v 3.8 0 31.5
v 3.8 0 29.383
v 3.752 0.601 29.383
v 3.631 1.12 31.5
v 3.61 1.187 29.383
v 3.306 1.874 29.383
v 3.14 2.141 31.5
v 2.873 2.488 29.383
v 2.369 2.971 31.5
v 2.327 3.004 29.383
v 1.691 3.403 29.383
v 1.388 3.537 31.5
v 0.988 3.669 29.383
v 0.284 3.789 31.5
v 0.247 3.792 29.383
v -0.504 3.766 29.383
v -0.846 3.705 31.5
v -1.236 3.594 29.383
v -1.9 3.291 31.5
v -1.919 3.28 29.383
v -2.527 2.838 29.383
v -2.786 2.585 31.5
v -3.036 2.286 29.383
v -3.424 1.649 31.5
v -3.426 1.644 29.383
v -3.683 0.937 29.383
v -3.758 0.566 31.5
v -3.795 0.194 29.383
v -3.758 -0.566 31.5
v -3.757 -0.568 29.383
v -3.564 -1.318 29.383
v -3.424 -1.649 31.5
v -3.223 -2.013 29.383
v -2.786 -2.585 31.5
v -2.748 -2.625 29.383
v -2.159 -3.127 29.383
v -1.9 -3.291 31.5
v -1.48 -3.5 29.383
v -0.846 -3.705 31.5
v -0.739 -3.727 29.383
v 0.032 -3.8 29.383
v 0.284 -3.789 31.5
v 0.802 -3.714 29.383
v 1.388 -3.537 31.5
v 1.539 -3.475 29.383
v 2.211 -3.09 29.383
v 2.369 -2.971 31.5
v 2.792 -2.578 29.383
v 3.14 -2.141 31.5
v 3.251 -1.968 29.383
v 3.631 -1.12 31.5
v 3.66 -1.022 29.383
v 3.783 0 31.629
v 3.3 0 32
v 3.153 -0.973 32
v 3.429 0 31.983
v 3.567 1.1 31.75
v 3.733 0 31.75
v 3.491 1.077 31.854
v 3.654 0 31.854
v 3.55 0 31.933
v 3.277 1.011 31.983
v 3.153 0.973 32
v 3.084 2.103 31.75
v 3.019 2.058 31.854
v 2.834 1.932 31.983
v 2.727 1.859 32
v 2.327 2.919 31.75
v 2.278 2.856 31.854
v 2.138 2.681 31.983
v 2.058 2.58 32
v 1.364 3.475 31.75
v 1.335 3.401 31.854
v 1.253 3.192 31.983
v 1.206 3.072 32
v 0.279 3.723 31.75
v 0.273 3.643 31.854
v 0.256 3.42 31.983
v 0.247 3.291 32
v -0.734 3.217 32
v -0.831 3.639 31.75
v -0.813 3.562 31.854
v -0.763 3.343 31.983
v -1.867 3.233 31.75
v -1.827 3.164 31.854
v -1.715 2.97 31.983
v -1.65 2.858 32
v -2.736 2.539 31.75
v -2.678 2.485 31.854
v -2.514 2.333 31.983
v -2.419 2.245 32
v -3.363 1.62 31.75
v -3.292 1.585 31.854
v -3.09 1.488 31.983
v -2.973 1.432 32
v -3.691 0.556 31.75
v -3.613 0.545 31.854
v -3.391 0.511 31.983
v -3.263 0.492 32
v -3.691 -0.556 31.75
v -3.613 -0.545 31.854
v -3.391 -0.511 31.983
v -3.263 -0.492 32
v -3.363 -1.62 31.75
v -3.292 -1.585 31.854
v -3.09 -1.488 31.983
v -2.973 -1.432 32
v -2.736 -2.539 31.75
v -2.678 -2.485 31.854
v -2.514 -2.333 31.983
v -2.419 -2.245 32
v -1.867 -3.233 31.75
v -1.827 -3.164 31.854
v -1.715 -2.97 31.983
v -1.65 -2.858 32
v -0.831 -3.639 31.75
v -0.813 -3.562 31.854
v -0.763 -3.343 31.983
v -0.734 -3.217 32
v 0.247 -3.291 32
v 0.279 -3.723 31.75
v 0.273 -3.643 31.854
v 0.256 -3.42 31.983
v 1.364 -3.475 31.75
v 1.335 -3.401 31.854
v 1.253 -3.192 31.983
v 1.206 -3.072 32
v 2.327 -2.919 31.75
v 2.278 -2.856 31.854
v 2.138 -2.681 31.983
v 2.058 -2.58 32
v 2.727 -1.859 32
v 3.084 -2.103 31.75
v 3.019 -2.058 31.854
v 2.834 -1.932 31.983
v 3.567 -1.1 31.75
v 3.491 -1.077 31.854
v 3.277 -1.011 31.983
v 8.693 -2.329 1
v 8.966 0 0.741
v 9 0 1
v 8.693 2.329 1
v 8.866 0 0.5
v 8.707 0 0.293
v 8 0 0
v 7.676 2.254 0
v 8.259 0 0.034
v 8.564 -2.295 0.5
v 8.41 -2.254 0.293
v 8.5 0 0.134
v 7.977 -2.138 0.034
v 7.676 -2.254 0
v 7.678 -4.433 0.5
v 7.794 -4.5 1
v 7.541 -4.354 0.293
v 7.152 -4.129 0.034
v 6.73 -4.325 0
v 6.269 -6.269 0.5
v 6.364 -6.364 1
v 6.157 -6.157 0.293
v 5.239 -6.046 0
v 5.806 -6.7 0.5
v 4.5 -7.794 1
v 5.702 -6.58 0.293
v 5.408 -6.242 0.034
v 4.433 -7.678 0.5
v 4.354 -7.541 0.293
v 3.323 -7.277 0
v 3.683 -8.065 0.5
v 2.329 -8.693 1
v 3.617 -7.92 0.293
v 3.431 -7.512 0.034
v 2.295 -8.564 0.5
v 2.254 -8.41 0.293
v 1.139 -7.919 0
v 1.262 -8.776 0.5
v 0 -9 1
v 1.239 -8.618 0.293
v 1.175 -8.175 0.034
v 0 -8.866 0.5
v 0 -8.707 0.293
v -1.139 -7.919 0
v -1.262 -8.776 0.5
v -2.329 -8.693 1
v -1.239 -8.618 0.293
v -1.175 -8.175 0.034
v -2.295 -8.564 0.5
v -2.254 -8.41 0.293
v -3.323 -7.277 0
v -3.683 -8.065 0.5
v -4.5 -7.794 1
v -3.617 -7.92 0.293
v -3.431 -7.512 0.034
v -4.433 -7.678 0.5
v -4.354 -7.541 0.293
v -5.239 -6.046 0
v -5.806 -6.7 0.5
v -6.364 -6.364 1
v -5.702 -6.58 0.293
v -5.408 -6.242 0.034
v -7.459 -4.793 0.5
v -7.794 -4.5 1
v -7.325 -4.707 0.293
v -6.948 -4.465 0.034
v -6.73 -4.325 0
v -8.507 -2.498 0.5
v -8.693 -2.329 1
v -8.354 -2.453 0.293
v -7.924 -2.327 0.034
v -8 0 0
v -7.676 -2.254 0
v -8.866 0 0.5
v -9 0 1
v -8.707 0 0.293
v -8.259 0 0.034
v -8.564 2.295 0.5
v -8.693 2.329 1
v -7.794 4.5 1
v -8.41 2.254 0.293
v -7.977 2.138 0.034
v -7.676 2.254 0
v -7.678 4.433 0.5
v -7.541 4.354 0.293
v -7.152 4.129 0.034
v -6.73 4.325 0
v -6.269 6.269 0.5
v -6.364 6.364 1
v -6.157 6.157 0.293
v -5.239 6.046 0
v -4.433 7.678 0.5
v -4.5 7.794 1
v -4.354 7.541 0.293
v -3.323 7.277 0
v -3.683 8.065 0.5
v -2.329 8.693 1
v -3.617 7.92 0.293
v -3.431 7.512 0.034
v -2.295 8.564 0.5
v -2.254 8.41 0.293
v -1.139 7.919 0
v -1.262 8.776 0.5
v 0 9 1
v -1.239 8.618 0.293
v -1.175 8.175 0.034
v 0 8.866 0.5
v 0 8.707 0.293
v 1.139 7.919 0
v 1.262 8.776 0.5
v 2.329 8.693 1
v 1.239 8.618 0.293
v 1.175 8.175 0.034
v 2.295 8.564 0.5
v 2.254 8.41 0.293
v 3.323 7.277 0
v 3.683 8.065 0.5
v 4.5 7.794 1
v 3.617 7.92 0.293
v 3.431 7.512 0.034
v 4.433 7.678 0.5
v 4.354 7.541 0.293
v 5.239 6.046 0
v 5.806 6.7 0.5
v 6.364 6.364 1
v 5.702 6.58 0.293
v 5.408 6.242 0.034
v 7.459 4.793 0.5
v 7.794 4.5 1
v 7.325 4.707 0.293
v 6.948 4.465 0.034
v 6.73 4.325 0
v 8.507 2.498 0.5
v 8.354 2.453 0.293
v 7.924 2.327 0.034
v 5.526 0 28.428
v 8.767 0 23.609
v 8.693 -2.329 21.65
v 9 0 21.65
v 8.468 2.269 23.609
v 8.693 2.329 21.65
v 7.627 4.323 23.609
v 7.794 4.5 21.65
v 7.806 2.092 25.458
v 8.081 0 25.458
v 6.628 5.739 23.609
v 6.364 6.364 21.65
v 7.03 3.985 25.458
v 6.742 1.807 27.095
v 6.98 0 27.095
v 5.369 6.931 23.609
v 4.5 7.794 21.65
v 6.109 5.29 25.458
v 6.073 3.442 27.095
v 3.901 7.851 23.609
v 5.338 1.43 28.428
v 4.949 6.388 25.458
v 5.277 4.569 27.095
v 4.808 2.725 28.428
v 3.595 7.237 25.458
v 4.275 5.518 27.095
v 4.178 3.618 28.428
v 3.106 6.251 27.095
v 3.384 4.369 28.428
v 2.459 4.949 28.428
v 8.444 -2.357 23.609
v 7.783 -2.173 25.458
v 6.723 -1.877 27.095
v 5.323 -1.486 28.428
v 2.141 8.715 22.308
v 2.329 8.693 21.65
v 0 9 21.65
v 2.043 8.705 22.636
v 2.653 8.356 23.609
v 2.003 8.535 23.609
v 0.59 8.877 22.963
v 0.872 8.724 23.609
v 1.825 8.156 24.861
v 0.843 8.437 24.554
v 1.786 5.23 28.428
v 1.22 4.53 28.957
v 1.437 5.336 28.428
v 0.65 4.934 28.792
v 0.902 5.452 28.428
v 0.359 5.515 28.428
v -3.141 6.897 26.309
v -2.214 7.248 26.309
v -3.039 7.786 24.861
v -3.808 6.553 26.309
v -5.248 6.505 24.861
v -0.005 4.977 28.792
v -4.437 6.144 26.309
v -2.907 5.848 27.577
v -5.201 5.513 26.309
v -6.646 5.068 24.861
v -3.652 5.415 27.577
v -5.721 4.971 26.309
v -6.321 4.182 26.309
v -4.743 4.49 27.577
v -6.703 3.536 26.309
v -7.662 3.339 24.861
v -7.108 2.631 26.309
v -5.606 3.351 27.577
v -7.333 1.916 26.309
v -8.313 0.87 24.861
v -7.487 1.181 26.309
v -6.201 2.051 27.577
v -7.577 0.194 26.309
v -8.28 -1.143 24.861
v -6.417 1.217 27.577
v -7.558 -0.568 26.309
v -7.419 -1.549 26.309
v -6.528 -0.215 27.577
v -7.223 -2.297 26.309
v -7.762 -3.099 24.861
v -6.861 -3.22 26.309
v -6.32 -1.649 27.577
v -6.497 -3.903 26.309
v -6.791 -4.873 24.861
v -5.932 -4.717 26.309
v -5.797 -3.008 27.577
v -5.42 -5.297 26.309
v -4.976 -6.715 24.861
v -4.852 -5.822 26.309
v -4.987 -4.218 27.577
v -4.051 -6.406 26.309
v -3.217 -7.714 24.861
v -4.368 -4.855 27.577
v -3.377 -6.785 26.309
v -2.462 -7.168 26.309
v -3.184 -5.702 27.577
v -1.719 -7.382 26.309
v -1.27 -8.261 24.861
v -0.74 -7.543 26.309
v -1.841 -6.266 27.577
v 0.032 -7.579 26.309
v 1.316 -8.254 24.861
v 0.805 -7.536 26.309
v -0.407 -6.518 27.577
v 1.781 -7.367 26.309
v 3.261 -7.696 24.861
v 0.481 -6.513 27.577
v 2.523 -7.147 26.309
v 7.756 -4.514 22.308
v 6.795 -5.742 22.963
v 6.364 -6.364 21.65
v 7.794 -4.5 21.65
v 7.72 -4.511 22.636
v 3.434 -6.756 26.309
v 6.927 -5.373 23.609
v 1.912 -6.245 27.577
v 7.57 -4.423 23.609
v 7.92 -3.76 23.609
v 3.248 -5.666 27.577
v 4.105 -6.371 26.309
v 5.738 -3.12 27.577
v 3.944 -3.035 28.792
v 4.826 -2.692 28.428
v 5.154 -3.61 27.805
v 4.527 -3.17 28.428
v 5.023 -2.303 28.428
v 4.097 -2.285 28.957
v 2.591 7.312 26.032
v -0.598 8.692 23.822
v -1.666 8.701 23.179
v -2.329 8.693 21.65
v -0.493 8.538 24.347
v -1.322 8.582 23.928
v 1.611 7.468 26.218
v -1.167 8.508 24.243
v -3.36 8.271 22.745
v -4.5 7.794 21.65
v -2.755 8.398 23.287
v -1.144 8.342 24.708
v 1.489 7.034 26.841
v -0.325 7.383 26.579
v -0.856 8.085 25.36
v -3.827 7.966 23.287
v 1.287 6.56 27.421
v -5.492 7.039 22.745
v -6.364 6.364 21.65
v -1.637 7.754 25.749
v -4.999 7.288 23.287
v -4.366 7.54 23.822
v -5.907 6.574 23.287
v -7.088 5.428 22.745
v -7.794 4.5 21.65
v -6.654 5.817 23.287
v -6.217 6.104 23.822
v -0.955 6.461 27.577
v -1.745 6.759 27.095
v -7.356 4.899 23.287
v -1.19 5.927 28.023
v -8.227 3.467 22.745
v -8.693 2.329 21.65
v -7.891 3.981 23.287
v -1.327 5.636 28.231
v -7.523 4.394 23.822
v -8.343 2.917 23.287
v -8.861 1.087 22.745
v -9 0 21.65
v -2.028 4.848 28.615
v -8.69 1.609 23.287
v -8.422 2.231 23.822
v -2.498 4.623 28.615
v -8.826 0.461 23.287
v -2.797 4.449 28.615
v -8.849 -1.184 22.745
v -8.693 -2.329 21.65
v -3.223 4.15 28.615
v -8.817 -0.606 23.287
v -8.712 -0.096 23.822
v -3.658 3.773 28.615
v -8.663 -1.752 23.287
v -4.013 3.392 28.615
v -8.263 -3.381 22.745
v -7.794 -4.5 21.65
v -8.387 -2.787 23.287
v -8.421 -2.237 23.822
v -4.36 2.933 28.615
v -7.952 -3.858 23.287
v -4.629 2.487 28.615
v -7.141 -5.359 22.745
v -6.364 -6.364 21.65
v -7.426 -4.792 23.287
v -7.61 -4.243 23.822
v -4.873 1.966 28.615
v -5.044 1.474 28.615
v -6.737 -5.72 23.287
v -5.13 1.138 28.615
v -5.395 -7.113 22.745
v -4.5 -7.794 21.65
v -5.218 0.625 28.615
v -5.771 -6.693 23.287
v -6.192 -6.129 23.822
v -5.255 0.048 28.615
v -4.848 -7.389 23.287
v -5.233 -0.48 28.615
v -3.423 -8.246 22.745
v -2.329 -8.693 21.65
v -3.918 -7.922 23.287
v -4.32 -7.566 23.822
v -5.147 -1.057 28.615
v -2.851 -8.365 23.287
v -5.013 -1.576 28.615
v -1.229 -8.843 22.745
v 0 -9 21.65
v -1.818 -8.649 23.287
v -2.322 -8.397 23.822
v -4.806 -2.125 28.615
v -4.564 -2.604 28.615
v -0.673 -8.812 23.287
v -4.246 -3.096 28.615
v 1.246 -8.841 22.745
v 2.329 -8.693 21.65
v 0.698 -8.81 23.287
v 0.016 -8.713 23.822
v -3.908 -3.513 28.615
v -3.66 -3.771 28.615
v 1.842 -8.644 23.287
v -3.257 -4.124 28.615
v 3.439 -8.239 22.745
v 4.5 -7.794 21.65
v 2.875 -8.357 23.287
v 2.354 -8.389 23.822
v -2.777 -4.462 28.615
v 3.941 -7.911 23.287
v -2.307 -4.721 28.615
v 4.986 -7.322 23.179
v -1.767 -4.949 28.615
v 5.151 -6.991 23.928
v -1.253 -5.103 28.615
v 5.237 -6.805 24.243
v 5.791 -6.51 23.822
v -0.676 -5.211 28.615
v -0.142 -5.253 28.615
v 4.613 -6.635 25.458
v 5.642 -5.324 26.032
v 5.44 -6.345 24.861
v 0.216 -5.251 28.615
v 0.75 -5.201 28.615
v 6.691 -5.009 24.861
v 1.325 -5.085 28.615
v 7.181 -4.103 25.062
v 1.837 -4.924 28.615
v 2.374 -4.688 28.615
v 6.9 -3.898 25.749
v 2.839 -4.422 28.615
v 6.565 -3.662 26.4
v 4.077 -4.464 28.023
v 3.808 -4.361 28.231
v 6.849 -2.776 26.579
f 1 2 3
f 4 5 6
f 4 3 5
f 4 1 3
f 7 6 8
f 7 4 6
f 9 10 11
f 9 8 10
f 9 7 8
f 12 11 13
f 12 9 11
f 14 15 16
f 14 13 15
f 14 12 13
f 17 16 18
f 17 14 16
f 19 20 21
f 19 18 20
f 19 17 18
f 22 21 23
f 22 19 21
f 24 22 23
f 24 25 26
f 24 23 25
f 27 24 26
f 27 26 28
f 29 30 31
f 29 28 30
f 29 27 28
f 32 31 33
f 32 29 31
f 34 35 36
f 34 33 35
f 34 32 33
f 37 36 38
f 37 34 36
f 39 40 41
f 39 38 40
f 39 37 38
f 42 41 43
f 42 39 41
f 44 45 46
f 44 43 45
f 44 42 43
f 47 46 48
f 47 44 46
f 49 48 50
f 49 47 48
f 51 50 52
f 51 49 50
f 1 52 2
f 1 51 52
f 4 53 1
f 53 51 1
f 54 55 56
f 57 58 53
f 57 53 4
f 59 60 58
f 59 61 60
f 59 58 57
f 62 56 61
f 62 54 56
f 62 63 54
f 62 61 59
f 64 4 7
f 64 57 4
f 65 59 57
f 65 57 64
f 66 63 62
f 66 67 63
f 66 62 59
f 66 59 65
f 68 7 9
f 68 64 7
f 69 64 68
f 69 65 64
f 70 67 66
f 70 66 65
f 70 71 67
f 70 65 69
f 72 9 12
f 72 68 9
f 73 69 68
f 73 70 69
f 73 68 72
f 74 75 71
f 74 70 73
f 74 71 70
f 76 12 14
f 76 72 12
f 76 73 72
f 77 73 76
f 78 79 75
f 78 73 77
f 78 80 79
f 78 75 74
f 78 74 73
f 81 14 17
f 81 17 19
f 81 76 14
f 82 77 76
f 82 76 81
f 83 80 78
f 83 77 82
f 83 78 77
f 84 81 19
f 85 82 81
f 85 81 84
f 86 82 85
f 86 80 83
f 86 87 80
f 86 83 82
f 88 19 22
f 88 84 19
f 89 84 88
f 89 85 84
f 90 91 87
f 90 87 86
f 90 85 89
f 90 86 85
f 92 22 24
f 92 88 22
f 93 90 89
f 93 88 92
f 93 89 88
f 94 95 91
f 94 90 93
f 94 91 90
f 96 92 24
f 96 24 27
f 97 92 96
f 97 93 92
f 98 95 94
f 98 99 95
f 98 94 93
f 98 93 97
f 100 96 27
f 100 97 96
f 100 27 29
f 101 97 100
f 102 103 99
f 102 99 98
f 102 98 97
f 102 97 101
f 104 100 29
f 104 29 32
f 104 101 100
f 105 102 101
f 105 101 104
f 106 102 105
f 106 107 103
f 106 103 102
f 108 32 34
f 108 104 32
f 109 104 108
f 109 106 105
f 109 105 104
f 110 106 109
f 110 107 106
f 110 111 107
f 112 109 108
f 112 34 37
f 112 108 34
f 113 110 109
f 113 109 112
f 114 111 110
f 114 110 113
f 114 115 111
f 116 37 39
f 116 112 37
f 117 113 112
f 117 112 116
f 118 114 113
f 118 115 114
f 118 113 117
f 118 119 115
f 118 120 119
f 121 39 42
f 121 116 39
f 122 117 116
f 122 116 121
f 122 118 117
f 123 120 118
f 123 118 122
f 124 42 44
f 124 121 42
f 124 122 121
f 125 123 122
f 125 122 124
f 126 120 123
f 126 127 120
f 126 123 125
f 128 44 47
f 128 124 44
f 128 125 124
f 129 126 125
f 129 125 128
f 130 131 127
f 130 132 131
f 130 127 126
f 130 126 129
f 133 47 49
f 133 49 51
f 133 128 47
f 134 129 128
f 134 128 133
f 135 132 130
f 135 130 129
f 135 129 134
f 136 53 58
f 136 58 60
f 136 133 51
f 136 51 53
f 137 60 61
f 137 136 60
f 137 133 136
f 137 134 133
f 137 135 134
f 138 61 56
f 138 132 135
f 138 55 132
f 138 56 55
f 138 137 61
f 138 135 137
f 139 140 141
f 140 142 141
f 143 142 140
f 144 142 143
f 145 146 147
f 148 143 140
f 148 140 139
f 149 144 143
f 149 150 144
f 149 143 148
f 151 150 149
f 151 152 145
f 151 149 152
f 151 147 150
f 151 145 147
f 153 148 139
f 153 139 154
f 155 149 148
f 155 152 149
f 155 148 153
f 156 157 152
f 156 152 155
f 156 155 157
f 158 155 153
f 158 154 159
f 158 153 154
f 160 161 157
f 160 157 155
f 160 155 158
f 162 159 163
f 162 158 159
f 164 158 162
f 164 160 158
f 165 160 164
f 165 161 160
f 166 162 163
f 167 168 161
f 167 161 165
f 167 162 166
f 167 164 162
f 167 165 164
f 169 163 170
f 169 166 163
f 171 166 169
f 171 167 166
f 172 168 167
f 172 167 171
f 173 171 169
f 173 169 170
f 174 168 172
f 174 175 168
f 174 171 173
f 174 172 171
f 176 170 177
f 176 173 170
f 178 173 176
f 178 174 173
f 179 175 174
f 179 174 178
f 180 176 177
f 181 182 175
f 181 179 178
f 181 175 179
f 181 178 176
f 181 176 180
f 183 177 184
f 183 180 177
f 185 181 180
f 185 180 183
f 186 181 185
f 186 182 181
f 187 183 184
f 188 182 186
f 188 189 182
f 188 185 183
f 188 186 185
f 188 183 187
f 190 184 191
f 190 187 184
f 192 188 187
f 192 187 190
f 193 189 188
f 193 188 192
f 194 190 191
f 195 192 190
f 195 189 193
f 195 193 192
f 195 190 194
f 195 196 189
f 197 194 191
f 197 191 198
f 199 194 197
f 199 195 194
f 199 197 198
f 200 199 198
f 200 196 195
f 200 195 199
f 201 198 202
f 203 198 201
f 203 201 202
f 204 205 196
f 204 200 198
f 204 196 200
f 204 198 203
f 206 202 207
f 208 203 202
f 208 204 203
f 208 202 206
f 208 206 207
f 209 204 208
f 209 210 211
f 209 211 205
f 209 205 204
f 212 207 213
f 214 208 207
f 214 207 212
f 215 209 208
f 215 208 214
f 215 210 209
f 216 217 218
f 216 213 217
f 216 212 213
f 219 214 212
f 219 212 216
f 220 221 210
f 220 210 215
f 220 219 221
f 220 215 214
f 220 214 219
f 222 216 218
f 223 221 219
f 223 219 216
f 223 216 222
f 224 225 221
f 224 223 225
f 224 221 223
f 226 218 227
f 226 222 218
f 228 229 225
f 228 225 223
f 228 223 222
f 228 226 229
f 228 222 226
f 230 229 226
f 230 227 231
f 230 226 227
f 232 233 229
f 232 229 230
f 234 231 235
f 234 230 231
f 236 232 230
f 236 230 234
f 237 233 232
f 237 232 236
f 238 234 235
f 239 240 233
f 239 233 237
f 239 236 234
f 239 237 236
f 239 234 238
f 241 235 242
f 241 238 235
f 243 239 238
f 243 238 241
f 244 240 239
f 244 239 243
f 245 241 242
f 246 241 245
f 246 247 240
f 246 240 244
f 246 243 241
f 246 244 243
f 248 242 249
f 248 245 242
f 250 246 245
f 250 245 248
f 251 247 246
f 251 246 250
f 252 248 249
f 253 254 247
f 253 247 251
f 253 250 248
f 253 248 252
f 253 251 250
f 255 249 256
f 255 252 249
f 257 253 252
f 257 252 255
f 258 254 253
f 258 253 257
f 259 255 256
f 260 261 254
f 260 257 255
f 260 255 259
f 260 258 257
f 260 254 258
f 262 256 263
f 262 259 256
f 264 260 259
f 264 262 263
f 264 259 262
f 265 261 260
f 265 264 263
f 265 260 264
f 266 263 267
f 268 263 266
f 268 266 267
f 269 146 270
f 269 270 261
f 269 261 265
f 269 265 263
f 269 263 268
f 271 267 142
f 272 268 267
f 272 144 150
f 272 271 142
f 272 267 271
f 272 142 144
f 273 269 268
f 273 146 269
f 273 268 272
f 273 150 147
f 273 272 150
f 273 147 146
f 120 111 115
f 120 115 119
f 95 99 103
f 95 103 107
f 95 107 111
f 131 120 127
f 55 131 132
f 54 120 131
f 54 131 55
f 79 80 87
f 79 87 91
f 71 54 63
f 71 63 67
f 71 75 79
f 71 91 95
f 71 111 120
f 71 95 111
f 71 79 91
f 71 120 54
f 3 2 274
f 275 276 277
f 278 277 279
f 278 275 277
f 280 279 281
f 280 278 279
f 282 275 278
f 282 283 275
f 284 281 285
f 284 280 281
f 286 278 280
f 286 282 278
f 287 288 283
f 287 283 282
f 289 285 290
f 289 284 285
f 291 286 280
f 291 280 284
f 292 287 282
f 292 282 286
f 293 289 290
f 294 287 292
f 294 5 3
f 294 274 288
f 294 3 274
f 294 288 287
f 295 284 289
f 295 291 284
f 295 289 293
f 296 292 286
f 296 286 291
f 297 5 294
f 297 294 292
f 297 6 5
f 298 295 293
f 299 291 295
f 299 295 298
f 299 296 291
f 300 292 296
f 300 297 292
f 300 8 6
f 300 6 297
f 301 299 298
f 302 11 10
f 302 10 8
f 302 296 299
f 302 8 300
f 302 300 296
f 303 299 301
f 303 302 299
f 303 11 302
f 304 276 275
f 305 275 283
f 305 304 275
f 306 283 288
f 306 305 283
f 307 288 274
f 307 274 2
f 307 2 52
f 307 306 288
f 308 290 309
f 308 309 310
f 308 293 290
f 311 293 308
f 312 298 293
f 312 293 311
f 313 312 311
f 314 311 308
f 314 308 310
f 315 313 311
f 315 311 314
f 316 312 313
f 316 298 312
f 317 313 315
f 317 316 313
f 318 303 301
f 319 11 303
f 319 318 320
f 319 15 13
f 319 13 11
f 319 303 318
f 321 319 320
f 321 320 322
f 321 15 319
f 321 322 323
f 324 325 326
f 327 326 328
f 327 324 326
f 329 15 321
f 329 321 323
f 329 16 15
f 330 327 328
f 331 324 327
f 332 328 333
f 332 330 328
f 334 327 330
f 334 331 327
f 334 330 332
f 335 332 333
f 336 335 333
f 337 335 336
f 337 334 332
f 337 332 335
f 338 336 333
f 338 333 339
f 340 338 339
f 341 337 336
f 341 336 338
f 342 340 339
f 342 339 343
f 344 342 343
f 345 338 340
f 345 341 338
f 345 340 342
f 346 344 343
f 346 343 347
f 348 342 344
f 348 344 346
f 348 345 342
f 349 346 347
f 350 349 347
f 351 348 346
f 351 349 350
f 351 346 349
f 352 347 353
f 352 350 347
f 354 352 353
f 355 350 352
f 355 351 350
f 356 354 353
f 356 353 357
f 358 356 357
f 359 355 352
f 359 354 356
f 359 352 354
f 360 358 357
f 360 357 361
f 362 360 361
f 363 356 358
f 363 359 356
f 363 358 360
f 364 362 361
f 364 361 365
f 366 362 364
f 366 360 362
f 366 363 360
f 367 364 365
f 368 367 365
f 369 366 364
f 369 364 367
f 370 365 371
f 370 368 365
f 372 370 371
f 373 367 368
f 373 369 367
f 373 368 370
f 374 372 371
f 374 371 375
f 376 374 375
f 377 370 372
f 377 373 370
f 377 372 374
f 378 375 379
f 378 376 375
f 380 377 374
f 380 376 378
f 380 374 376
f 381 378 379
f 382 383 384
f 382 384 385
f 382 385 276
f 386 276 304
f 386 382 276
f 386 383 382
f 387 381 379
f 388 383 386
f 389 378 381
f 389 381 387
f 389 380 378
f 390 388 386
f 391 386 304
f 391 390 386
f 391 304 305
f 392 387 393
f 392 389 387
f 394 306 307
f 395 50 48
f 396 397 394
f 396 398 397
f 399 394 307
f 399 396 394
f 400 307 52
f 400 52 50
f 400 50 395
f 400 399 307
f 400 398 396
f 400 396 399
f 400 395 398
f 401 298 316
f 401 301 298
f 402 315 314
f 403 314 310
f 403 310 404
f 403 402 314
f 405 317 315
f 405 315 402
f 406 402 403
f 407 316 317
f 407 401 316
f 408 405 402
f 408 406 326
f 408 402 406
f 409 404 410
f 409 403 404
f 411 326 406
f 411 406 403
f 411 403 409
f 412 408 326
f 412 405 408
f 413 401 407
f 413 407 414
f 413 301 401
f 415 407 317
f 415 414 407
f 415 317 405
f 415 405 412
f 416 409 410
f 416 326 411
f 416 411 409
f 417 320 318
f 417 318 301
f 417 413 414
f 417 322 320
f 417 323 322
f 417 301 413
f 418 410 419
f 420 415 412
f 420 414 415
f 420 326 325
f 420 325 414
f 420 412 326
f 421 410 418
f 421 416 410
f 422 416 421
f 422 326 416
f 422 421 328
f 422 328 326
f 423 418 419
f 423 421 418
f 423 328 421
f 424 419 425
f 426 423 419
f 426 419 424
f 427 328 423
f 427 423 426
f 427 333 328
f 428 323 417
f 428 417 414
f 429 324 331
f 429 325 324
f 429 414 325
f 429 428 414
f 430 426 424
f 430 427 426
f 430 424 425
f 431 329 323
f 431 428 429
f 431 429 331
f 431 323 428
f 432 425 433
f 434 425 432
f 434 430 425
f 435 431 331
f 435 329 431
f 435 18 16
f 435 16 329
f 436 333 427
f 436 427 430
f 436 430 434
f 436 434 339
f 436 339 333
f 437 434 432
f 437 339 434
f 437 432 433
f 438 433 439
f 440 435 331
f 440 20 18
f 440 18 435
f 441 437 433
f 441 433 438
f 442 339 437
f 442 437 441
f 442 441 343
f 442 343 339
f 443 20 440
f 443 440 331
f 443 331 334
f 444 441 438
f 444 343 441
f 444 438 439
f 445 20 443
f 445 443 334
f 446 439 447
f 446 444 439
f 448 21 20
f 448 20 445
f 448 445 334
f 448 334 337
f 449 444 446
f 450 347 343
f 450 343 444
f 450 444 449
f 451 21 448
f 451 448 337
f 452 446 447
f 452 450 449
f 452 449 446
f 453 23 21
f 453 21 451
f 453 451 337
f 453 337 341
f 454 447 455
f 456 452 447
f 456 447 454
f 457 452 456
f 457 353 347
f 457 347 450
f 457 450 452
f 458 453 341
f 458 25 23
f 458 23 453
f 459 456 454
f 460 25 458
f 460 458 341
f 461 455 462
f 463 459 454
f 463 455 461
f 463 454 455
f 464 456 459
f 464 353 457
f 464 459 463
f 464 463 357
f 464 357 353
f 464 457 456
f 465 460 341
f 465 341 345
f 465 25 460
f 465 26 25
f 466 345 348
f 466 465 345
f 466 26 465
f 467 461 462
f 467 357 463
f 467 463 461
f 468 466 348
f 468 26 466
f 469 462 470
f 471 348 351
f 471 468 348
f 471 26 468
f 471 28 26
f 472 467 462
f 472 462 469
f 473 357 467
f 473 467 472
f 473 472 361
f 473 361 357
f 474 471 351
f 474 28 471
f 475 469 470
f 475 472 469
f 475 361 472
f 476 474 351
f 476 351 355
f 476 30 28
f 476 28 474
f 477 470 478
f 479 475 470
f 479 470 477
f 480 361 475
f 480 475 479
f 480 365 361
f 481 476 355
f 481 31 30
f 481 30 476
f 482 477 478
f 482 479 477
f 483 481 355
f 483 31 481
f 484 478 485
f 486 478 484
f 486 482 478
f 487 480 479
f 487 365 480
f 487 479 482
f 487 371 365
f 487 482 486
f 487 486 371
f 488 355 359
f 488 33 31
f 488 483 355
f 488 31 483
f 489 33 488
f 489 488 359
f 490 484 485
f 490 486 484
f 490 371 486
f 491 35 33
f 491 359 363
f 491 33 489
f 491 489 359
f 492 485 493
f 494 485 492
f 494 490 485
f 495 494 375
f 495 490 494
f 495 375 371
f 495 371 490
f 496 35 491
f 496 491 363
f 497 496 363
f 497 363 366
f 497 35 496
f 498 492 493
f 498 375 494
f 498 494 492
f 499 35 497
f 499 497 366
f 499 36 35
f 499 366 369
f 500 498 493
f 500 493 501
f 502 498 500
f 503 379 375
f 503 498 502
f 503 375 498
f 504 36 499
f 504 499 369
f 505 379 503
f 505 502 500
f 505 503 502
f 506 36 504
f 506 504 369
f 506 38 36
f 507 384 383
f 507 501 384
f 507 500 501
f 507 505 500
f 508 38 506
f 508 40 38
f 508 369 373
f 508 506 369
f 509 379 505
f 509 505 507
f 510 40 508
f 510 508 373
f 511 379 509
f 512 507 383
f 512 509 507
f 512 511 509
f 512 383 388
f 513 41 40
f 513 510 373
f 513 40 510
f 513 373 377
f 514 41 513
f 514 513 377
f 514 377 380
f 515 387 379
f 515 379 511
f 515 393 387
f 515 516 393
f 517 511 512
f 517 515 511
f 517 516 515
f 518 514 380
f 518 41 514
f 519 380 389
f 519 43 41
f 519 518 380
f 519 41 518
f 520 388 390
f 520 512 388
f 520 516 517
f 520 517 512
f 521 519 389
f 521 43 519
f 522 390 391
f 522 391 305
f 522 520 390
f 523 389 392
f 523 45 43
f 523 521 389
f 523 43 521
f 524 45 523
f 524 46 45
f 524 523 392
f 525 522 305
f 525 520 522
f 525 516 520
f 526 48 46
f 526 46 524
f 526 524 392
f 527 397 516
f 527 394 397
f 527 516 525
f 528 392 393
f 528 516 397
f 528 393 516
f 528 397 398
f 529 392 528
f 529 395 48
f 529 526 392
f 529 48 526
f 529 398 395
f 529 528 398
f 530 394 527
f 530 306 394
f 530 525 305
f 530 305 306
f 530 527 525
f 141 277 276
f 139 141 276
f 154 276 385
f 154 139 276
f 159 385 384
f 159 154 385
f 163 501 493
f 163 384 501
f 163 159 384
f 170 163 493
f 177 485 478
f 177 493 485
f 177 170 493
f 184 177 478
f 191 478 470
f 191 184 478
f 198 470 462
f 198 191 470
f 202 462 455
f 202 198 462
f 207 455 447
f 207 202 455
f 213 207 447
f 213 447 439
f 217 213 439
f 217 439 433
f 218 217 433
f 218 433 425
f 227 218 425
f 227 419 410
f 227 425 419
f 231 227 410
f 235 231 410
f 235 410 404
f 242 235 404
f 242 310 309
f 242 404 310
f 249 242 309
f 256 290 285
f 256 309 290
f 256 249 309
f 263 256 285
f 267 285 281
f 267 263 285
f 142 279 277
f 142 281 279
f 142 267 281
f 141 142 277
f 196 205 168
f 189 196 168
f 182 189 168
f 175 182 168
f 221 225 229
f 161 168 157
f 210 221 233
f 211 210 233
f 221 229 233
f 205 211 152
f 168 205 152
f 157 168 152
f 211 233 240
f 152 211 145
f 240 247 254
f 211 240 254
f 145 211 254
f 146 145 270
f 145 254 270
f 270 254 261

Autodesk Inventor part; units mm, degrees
ref_plane "YZ Plane" through (0, 0, 0) normal (1, 0, 0) x (0, 1, 0)
ref_plane "XZ Plane" through (0, 0, 0) normal (0, 1, 0) x (-1, 0, 0)
ref_plane "XY Plane" through (0, 0, 0) normal (0, 0, 1) x (1, 0, 0)
sketch "Sketch1" plane through (0, 0, 0) normal (0, 0, 1) x (1, 0, 0)
  circle A0 centre (0, 0) radius 9
  dimension "d0" = 18
extrude "Extrusion1" add sketch "Sketch1" along normal blind 30
fillet "Fillet1" radius 8.35 1 edges at (-9, 0, 30)
sketch "Sketch2" plane through (0, 0, 30) normal (0, 0, 1) x (1, 0, 0)
  circle A0 centre (0, 0) radius 3.8
  dimension "d4" = 7.6
extrude "Extrusion2" add sketch "Sketch2" along normal blind 2 and the other way blind 1
fillet "Fillet2" radius 1 1 edges at (-9, 0, 0)
fillet "Fillet3" radius 0.5 1 edges at (-3.8, 0, 32)
properties part number "4g_CO2_Cartridge"
